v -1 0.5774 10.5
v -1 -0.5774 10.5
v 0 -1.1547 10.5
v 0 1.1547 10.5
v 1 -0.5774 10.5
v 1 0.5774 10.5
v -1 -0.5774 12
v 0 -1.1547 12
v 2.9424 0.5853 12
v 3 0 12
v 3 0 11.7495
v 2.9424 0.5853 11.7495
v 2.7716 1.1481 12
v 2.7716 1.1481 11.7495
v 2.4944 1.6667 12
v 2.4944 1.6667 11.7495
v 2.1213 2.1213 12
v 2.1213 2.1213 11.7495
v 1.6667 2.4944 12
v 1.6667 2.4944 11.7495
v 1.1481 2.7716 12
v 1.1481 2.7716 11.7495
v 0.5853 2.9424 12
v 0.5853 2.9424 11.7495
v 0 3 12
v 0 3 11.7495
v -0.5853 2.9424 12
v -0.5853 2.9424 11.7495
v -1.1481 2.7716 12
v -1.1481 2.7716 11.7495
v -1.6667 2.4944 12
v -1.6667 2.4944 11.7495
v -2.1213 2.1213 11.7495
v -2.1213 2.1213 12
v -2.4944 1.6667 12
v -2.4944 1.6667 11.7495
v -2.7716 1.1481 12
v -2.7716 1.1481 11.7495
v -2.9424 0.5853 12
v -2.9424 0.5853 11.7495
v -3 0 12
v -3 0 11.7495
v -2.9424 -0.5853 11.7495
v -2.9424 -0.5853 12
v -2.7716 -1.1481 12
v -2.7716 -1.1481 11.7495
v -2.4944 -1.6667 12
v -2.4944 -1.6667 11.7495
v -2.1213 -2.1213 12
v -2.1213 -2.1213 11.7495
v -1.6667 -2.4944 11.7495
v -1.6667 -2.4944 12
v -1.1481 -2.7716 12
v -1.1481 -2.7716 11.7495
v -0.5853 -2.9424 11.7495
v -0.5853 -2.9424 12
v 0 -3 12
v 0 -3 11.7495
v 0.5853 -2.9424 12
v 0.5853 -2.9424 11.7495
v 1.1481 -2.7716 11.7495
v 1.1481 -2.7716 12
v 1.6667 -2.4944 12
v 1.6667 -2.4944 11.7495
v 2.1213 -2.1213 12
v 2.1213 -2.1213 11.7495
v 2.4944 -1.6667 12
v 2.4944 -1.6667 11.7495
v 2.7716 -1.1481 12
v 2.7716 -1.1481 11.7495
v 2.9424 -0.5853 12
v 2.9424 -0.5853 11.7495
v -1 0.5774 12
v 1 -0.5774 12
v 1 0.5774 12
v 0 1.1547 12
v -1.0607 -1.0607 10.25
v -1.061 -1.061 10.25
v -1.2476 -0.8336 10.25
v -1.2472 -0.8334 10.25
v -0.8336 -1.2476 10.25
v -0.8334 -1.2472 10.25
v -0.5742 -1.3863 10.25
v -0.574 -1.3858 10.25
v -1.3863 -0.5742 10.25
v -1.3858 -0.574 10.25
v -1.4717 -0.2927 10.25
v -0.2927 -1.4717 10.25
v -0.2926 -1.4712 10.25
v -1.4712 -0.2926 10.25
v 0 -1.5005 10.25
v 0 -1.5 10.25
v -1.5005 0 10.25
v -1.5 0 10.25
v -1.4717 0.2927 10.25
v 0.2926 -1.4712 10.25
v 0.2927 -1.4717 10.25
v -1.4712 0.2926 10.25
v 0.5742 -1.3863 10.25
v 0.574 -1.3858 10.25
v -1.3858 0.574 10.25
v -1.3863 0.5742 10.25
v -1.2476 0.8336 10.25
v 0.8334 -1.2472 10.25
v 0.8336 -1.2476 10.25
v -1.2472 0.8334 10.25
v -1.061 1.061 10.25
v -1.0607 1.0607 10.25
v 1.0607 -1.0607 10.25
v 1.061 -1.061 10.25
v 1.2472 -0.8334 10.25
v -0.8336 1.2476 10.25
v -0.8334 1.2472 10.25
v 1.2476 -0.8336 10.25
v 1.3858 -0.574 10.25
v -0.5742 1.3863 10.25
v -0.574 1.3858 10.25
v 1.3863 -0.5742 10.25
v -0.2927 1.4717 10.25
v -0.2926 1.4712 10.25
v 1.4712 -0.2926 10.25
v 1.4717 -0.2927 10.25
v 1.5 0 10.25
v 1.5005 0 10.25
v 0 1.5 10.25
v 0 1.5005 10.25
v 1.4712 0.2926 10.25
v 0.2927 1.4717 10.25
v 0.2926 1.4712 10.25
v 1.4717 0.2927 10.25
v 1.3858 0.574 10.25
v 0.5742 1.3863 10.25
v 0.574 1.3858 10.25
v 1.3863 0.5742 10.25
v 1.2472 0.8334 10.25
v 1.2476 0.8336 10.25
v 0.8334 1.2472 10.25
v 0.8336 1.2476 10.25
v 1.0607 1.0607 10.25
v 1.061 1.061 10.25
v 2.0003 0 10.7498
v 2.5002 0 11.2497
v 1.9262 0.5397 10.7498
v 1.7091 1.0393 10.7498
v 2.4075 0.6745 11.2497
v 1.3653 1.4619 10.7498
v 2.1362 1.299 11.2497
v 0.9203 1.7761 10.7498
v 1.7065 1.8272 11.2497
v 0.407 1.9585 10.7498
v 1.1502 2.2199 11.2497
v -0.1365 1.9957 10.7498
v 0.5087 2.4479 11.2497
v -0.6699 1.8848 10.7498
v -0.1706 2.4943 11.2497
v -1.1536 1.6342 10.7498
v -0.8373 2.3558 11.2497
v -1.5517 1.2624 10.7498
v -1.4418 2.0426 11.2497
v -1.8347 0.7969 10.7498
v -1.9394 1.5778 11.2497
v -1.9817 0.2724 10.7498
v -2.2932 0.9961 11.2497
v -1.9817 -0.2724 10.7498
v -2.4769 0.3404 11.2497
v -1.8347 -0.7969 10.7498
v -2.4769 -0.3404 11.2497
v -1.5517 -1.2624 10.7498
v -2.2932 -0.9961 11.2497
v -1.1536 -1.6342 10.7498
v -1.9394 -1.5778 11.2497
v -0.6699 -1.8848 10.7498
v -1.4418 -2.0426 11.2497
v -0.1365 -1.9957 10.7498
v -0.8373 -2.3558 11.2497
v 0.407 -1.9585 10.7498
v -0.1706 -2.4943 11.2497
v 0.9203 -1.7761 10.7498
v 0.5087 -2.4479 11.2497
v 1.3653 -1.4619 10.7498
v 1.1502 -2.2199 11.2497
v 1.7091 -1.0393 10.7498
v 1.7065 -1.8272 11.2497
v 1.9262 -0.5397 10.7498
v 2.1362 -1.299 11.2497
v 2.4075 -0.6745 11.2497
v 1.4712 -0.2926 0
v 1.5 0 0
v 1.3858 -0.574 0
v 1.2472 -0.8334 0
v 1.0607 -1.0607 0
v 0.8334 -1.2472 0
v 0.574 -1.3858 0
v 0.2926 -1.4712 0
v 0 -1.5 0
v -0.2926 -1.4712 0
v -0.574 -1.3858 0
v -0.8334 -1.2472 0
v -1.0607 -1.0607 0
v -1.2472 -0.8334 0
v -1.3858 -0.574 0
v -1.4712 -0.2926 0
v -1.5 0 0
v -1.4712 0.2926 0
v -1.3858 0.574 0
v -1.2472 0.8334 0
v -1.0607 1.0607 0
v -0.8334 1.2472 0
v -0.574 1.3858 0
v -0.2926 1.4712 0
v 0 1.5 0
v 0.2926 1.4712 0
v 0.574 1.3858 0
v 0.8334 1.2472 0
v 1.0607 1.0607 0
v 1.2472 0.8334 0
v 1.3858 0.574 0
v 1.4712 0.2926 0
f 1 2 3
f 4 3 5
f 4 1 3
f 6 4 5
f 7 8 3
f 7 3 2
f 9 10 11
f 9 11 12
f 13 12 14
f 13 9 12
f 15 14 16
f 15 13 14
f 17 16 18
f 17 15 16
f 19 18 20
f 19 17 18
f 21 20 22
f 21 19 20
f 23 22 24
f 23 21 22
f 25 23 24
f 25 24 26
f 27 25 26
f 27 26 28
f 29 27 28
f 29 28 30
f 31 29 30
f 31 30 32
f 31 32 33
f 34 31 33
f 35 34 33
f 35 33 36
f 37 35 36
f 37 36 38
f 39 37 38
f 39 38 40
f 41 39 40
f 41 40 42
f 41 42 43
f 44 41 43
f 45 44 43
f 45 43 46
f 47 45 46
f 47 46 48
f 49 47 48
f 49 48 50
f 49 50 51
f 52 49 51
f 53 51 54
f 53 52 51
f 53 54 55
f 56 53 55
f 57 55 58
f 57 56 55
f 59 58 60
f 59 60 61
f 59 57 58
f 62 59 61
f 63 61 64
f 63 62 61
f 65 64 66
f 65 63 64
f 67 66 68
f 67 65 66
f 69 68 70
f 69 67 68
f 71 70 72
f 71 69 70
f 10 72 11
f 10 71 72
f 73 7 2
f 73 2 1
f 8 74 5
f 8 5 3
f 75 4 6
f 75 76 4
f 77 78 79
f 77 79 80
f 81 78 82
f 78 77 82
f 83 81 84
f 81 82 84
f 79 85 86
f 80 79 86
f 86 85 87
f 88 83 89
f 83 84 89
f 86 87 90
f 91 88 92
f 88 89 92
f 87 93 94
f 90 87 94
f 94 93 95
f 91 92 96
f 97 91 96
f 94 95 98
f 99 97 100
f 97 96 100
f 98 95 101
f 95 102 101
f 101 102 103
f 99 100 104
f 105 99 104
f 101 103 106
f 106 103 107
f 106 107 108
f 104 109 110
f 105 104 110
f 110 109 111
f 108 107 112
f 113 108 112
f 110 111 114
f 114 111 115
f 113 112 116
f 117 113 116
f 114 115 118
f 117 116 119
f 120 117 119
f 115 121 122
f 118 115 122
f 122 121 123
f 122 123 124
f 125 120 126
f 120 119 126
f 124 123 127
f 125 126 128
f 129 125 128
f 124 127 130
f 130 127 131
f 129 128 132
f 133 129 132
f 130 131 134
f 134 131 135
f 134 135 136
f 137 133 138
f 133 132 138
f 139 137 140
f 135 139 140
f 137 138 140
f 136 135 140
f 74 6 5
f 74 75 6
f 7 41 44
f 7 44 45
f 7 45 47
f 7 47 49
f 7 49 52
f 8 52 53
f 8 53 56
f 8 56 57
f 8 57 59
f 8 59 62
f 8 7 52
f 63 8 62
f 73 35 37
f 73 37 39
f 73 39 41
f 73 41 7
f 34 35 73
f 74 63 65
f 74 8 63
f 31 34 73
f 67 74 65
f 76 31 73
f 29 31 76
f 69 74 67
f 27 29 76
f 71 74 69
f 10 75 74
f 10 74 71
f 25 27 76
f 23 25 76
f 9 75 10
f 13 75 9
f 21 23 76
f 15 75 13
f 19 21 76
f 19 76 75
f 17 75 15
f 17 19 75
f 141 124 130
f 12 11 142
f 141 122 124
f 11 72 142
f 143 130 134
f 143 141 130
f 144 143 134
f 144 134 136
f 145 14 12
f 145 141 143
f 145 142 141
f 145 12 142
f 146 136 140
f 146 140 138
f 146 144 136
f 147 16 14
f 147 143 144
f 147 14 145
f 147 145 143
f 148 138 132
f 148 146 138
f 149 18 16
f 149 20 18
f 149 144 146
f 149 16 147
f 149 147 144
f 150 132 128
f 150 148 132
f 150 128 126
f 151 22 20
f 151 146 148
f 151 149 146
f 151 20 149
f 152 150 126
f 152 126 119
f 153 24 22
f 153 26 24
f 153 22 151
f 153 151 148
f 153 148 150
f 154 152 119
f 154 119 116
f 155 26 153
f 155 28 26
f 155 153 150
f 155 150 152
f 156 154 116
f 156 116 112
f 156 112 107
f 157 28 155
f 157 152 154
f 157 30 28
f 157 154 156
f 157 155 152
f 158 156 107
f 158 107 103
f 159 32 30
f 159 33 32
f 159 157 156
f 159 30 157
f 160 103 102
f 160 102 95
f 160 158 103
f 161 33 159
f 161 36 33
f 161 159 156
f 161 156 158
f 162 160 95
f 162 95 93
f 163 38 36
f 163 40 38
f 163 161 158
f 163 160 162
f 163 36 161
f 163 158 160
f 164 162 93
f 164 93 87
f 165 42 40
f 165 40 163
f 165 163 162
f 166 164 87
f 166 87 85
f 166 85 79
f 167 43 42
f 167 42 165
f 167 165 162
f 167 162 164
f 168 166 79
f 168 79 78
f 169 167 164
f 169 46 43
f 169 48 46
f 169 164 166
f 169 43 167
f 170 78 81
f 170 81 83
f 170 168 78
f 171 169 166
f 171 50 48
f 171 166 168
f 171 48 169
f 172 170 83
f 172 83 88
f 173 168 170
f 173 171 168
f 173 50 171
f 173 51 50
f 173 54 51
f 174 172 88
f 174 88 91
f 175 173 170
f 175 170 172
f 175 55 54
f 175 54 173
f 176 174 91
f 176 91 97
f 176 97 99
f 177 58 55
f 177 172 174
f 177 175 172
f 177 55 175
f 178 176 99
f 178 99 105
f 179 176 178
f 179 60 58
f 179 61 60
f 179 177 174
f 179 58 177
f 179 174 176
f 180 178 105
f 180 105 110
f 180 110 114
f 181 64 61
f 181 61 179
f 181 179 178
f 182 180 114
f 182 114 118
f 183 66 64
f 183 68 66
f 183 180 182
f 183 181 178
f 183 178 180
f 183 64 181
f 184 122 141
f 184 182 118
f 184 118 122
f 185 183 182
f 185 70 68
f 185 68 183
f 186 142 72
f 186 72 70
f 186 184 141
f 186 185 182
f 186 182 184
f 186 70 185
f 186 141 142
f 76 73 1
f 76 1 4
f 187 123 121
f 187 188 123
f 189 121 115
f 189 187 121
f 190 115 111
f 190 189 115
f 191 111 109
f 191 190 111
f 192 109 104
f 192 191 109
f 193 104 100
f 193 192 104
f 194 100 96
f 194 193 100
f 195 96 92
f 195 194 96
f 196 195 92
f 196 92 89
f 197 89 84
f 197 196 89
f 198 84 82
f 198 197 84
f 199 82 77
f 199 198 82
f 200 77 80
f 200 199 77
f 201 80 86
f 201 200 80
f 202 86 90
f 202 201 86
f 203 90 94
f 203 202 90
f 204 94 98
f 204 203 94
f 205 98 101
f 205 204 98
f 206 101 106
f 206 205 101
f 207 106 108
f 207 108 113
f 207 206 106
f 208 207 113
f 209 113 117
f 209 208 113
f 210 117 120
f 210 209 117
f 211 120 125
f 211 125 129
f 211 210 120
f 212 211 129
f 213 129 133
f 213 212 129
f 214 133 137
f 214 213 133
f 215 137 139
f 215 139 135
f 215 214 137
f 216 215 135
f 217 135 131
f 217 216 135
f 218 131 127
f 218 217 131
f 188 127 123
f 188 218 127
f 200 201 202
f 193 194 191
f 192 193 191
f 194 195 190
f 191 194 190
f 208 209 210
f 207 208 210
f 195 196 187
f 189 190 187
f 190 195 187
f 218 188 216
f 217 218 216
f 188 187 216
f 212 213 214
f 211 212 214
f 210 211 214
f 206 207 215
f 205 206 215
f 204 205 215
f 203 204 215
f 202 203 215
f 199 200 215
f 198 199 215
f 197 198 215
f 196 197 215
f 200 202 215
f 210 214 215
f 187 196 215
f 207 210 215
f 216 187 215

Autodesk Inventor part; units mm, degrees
ref_plane "YZ Plane" through (0, 0, 0) normal (1, 0, 0) x (0, 1, 0)
ref_plane "XZ Plane" through (0, 0, 0) normal (0, 1, 0) x (-1, 0, 0)
ref_plane "XY Plane" through (0, 0, 0) normal (0, 0, 1) x (1, 0, 0)
sketch "スケッチ1" plane through (0, 0, 0) normal (0, 0, 1) x (1, 0, 0)
  circle A0 centre (0, 0) radius 1.5
  dimension "d0" = 3
extrude "押し出し1" add sketch "スケッチ1" along normal blind 12
thread "ねじ1" size "M3x0.5" class "6g" standard "ANSI Metric M Profile" full length
sketch "スケッチ2" plane through (0, 0, 12) normal (0, 0, 1) x (1, 0, 0)
  circle A0 centre (0, 0) radius 3
  dimension "d5" = 6
extrude "押し出し2" add sketch "スケッチ2" against normal blind 1.75
chamfer "面取り1" distance 1.5 angle 45 1 edges at (-3, 0, 10.25)
sketch "スケッチ3" plane through (0, 0, 12) normal (0, 0, 1) x (1, 0, 0)
  line L0 (0, 1.1547) -> (1, 0.5774)
  line L1 (1, 0.5774) -> (1, -0.5774)
  line L2 (1, -0.5774) -> (0, -1.1547)
  line L3 (0, -1.1547) -> (-1, -0.5774)
  line L4 (-1, -0.5774) -> (-1, 0.5774)
  line L5 (-1, 0.5774) -> (0, 1.1547)
  point P0 (0, 0)
  point P1 (0, 0)
  dimension "d11" = 2
extrude "押し出し3" cut sketch "スケッチ3" against normal blind 1.5
properties part number "m3皿ネジ12" material "鉄 灰色"
